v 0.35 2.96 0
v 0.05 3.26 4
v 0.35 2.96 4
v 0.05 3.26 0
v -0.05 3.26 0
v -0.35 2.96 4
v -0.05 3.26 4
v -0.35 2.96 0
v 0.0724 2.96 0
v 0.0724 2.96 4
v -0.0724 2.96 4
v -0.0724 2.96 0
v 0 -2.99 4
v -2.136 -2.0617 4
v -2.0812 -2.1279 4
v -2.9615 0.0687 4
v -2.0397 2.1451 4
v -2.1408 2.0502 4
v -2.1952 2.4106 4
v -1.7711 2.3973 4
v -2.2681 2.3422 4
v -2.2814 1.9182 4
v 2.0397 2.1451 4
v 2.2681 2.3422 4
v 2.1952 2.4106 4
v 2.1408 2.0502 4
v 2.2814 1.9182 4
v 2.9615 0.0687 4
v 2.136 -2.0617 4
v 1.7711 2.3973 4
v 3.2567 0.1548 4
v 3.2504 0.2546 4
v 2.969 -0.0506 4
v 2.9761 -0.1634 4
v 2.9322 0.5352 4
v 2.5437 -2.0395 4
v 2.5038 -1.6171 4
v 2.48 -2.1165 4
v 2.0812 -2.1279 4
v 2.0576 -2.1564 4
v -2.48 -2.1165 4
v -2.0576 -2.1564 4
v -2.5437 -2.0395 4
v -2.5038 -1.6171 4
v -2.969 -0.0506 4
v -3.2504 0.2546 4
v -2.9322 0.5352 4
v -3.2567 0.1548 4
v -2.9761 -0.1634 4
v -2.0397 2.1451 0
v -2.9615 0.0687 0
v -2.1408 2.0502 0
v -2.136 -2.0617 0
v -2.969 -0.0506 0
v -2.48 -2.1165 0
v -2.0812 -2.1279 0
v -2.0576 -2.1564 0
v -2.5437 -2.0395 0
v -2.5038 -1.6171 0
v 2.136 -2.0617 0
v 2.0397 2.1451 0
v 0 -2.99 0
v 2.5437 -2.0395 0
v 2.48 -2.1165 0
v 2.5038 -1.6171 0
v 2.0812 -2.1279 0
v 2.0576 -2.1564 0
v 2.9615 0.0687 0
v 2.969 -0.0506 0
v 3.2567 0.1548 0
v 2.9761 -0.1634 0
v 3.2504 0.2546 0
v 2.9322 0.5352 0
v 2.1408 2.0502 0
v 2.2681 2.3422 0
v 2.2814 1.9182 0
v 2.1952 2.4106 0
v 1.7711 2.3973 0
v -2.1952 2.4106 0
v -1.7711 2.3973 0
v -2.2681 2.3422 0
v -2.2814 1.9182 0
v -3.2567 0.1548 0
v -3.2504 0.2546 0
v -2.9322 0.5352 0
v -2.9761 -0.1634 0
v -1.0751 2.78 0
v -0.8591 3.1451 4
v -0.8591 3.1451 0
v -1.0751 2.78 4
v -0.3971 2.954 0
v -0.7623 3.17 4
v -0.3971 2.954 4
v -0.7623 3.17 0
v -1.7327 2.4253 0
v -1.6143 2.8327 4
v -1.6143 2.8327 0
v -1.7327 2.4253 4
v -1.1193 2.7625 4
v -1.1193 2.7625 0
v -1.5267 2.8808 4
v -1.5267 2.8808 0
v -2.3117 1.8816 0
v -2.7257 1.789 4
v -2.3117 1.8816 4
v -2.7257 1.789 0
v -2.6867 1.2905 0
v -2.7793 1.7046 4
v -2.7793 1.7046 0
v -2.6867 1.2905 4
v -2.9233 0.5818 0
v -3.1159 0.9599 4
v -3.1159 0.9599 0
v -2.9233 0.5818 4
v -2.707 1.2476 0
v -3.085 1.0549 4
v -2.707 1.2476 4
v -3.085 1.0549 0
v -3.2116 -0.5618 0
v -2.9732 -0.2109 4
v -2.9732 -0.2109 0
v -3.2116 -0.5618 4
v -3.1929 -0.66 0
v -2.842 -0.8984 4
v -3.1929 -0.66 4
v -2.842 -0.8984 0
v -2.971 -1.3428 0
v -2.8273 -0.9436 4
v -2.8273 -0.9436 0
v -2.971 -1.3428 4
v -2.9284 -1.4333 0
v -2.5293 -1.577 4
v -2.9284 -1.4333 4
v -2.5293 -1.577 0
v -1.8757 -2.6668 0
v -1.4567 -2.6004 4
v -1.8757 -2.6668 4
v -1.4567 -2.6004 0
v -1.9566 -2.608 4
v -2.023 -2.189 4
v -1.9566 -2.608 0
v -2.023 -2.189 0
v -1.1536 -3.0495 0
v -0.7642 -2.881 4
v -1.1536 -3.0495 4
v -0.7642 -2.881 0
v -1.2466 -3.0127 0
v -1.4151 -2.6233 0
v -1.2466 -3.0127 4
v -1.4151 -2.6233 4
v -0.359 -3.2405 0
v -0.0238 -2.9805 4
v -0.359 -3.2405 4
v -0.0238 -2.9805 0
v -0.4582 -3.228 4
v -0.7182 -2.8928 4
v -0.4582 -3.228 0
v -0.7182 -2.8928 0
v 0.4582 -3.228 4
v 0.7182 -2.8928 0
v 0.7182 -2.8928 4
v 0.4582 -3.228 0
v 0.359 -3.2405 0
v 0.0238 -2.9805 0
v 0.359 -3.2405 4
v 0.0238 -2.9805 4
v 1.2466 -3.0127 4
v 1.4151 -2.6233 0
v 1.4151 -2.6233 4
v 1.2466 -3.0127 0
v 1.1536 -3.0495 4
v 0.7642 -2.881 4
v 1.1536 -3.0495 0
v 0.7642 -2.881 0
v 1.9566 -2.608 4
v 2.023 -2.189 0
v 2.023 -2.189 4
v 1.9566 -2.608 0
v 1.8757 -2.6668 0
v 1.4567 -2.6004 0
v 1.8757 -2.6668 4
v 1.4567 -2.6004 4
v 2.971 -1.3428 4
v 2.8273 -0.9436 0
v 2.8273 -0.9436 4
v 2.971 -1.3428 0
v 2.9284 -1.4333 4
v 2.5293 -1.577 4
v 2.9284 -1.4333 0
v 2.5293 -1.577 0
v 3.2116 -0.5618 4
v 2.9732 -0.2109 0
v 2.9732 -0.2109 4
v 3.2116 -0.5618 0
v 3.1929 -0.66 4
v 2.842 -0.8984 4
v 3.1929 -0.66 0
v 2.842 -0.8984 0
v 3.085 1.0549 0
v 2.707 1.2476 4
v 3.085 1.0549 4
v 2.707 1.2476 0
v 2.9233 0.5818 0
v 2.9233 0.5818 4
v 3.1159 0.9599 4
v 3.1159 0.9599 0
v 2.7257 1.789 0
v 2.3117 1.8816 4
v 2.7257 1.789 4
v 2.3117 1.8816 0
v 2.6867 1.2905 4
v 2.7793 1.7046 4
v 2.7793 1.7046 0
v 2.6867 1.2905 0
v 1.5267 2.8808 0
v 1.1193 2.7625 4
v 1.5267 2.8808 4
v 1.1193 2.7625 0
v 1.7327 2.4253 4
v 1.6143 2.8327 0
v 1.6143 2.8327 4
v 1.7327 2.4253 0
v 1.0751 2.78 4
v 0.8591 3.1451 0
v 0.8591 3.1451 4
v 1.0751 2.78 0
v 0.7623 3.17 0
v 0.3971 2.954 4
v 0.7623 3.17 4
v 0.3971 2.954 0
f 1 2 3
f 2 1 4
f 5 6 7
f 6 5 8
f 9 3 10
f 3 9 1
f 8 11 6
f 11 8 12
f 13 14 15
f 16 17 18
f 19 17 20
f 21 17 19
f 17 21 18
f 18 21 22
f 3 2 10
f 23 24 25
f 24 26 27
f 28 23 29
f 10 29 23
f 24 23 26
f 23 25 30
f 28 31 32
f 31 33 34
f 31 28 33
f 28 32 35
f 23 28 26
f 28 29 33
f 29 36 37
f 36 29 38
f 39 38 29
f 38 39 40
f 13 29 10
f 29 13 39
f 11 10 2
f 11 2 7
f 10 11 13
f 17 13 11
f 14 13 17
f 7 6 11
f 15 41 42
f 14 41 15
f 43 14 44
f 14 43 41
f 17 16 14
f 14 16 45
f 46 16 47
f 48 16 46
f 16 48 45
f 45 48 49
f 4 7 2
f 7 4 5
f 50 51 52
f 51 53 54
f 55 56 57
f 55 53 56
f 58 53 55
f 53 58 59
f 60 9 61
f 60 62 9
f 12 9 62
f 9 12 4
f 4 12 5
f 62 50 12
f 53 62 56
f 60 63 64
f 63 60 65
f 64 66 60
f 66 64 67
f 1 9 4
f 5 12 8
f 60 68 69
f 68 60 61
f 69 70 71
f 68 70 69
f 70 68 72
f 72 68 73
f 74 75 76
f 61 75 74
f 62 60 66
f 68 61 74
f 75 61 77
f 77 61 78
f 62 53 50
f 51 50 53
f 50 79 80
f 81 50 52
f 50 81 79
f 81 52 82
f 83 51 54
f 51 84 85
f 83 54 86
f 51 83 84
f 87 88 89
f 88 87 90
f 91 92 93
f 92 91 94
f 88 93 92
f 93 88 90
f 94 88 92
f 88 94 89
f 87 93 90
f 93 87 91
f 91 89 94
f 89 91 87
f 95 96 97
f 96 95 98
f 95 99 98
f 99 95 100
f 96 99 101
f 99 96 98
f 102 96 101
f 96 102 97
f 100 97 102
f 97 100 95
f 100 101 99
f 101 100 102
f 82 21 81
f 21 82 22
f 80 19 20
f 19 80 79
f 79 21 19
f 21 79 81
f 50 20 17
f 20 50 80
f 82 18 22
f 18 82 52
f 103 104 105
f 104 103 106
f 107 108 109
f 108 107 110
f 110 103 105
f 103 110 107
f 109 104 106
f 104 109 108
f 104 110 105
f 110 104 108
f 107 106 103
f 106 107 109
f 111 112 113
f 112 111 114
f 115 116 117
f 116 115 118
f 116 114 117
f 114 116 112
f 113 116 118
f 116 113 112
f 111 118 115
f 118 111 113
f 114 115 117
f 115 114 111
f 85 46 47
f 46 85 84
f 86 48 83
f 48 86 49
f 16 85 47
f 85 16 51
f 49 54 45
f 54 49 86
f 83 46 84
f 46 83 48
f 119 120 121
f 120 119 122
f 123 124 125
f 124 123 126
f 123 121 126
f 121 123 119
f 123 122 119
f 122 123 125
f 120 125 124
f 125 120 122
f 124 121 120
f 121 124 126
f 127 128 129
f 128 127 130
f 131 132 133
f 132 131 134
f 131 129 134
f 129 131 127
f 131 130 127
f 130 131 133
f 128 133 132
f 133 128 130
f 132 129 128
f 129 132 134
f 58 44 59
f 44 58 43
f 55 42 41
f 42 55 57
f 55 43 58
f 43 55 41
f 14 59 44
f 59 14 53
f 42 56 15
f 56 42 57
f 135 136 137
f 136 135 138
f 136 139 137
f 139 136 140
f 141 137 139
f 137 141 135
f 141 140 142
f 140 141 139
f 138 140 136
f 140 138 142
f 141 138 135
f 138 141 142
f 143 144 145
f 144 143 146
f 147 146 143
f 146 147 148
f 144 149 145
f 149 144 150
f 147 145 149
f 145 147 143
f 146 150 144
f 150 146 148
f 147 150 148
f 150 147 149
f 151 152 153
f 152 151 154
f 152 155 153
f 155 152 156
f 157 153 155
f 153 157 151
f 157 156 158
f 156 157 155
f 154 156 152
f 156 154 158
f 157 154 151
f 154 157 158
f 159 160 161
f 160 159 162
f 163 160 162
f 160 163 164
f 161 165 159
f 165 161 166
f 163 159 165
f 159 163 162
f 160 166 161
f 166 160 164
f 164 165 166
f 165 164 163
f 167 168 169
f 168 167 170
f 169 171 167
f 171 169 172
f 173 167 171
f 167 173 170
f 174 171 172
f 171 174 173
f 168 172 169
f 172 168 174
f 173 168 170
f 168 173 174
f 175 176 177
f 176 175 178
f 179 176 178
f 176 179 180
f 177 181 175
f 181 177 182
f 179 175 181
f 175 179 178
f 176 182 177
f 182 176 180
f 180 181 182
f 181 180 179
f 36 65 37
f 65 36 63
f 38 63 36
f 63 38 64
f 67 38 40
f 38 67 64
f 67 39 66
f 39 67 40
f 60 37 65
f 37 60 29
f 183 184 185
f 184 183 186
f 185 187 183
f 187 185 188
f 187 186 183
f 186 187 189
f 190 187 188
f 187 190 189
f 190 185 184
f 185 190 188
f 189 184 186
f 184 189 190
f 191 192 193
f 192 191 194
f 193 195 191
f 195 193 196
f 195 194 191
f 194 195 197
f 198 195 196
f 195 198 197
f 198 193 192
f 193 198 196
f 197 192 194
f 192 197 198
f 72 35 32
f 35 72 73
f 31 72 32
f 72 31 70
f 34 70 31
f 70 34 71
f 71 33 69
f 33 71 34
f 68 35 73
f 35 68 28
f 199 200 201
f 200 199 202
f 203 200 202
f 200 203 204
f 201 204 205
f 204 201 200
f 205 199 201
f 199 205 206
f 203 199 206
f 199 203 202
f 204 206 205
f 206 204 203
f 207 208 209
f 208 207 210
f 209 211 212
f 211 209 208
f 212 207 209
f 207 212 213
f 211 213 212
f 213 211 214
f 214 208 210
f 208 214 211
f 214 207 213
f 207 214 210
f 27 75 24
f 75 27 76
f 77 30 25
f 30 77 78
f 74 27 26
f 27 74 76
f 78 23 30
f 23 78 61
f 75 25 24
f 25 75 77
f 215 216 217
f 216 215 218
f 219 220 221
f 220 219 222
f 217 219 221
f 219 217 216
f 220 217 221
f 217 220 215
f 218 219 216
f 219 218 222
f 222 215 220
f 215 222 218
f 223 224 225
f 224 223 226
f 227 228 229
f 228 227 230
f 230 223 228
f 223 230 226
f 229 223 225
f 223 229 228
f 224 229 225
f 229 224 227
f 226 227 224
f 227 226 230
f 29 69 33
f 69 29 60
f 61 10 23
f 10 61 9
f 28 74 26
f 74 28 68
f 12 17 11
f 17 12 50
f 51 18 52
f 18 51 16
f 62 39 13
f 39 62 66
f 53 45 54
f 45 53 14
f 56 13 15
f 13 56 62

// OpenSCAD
toothLength = 0.7;
toothWidth = 0.1;
toothHeight = 0.3;
toothCount = 25;
headHeight = 4;
headDiameter = 5.92;
headScrewDiameter = 2.5;
headThickness = 1.1;
clear = 0.3;

radius = headDiameter / 2 - toothHeight + clear;

cylinder(r1 = radius + 0.03, r2 = radius + 0.03, h = headHeight, center = false, $fa = toothCount * 2);

for (i = [ 0 : toothCount-1 ]) {
    rotate( a = [ 0, 0, i * (360.0 / toothCount)]) {
        translate(v = [0, radius, 0 ]) {
            linear_extrude(height = headHeight) {
                polygon(points = [
                    [ -toothLength / 2, 0 ],
                    [ toothLength / 2, 0 ],
                    [ toothWidth / 2, toothHeight ],
                    [ -toothWidth / 2, toothHeight ]
                ]);
            };
        };
    };
};
